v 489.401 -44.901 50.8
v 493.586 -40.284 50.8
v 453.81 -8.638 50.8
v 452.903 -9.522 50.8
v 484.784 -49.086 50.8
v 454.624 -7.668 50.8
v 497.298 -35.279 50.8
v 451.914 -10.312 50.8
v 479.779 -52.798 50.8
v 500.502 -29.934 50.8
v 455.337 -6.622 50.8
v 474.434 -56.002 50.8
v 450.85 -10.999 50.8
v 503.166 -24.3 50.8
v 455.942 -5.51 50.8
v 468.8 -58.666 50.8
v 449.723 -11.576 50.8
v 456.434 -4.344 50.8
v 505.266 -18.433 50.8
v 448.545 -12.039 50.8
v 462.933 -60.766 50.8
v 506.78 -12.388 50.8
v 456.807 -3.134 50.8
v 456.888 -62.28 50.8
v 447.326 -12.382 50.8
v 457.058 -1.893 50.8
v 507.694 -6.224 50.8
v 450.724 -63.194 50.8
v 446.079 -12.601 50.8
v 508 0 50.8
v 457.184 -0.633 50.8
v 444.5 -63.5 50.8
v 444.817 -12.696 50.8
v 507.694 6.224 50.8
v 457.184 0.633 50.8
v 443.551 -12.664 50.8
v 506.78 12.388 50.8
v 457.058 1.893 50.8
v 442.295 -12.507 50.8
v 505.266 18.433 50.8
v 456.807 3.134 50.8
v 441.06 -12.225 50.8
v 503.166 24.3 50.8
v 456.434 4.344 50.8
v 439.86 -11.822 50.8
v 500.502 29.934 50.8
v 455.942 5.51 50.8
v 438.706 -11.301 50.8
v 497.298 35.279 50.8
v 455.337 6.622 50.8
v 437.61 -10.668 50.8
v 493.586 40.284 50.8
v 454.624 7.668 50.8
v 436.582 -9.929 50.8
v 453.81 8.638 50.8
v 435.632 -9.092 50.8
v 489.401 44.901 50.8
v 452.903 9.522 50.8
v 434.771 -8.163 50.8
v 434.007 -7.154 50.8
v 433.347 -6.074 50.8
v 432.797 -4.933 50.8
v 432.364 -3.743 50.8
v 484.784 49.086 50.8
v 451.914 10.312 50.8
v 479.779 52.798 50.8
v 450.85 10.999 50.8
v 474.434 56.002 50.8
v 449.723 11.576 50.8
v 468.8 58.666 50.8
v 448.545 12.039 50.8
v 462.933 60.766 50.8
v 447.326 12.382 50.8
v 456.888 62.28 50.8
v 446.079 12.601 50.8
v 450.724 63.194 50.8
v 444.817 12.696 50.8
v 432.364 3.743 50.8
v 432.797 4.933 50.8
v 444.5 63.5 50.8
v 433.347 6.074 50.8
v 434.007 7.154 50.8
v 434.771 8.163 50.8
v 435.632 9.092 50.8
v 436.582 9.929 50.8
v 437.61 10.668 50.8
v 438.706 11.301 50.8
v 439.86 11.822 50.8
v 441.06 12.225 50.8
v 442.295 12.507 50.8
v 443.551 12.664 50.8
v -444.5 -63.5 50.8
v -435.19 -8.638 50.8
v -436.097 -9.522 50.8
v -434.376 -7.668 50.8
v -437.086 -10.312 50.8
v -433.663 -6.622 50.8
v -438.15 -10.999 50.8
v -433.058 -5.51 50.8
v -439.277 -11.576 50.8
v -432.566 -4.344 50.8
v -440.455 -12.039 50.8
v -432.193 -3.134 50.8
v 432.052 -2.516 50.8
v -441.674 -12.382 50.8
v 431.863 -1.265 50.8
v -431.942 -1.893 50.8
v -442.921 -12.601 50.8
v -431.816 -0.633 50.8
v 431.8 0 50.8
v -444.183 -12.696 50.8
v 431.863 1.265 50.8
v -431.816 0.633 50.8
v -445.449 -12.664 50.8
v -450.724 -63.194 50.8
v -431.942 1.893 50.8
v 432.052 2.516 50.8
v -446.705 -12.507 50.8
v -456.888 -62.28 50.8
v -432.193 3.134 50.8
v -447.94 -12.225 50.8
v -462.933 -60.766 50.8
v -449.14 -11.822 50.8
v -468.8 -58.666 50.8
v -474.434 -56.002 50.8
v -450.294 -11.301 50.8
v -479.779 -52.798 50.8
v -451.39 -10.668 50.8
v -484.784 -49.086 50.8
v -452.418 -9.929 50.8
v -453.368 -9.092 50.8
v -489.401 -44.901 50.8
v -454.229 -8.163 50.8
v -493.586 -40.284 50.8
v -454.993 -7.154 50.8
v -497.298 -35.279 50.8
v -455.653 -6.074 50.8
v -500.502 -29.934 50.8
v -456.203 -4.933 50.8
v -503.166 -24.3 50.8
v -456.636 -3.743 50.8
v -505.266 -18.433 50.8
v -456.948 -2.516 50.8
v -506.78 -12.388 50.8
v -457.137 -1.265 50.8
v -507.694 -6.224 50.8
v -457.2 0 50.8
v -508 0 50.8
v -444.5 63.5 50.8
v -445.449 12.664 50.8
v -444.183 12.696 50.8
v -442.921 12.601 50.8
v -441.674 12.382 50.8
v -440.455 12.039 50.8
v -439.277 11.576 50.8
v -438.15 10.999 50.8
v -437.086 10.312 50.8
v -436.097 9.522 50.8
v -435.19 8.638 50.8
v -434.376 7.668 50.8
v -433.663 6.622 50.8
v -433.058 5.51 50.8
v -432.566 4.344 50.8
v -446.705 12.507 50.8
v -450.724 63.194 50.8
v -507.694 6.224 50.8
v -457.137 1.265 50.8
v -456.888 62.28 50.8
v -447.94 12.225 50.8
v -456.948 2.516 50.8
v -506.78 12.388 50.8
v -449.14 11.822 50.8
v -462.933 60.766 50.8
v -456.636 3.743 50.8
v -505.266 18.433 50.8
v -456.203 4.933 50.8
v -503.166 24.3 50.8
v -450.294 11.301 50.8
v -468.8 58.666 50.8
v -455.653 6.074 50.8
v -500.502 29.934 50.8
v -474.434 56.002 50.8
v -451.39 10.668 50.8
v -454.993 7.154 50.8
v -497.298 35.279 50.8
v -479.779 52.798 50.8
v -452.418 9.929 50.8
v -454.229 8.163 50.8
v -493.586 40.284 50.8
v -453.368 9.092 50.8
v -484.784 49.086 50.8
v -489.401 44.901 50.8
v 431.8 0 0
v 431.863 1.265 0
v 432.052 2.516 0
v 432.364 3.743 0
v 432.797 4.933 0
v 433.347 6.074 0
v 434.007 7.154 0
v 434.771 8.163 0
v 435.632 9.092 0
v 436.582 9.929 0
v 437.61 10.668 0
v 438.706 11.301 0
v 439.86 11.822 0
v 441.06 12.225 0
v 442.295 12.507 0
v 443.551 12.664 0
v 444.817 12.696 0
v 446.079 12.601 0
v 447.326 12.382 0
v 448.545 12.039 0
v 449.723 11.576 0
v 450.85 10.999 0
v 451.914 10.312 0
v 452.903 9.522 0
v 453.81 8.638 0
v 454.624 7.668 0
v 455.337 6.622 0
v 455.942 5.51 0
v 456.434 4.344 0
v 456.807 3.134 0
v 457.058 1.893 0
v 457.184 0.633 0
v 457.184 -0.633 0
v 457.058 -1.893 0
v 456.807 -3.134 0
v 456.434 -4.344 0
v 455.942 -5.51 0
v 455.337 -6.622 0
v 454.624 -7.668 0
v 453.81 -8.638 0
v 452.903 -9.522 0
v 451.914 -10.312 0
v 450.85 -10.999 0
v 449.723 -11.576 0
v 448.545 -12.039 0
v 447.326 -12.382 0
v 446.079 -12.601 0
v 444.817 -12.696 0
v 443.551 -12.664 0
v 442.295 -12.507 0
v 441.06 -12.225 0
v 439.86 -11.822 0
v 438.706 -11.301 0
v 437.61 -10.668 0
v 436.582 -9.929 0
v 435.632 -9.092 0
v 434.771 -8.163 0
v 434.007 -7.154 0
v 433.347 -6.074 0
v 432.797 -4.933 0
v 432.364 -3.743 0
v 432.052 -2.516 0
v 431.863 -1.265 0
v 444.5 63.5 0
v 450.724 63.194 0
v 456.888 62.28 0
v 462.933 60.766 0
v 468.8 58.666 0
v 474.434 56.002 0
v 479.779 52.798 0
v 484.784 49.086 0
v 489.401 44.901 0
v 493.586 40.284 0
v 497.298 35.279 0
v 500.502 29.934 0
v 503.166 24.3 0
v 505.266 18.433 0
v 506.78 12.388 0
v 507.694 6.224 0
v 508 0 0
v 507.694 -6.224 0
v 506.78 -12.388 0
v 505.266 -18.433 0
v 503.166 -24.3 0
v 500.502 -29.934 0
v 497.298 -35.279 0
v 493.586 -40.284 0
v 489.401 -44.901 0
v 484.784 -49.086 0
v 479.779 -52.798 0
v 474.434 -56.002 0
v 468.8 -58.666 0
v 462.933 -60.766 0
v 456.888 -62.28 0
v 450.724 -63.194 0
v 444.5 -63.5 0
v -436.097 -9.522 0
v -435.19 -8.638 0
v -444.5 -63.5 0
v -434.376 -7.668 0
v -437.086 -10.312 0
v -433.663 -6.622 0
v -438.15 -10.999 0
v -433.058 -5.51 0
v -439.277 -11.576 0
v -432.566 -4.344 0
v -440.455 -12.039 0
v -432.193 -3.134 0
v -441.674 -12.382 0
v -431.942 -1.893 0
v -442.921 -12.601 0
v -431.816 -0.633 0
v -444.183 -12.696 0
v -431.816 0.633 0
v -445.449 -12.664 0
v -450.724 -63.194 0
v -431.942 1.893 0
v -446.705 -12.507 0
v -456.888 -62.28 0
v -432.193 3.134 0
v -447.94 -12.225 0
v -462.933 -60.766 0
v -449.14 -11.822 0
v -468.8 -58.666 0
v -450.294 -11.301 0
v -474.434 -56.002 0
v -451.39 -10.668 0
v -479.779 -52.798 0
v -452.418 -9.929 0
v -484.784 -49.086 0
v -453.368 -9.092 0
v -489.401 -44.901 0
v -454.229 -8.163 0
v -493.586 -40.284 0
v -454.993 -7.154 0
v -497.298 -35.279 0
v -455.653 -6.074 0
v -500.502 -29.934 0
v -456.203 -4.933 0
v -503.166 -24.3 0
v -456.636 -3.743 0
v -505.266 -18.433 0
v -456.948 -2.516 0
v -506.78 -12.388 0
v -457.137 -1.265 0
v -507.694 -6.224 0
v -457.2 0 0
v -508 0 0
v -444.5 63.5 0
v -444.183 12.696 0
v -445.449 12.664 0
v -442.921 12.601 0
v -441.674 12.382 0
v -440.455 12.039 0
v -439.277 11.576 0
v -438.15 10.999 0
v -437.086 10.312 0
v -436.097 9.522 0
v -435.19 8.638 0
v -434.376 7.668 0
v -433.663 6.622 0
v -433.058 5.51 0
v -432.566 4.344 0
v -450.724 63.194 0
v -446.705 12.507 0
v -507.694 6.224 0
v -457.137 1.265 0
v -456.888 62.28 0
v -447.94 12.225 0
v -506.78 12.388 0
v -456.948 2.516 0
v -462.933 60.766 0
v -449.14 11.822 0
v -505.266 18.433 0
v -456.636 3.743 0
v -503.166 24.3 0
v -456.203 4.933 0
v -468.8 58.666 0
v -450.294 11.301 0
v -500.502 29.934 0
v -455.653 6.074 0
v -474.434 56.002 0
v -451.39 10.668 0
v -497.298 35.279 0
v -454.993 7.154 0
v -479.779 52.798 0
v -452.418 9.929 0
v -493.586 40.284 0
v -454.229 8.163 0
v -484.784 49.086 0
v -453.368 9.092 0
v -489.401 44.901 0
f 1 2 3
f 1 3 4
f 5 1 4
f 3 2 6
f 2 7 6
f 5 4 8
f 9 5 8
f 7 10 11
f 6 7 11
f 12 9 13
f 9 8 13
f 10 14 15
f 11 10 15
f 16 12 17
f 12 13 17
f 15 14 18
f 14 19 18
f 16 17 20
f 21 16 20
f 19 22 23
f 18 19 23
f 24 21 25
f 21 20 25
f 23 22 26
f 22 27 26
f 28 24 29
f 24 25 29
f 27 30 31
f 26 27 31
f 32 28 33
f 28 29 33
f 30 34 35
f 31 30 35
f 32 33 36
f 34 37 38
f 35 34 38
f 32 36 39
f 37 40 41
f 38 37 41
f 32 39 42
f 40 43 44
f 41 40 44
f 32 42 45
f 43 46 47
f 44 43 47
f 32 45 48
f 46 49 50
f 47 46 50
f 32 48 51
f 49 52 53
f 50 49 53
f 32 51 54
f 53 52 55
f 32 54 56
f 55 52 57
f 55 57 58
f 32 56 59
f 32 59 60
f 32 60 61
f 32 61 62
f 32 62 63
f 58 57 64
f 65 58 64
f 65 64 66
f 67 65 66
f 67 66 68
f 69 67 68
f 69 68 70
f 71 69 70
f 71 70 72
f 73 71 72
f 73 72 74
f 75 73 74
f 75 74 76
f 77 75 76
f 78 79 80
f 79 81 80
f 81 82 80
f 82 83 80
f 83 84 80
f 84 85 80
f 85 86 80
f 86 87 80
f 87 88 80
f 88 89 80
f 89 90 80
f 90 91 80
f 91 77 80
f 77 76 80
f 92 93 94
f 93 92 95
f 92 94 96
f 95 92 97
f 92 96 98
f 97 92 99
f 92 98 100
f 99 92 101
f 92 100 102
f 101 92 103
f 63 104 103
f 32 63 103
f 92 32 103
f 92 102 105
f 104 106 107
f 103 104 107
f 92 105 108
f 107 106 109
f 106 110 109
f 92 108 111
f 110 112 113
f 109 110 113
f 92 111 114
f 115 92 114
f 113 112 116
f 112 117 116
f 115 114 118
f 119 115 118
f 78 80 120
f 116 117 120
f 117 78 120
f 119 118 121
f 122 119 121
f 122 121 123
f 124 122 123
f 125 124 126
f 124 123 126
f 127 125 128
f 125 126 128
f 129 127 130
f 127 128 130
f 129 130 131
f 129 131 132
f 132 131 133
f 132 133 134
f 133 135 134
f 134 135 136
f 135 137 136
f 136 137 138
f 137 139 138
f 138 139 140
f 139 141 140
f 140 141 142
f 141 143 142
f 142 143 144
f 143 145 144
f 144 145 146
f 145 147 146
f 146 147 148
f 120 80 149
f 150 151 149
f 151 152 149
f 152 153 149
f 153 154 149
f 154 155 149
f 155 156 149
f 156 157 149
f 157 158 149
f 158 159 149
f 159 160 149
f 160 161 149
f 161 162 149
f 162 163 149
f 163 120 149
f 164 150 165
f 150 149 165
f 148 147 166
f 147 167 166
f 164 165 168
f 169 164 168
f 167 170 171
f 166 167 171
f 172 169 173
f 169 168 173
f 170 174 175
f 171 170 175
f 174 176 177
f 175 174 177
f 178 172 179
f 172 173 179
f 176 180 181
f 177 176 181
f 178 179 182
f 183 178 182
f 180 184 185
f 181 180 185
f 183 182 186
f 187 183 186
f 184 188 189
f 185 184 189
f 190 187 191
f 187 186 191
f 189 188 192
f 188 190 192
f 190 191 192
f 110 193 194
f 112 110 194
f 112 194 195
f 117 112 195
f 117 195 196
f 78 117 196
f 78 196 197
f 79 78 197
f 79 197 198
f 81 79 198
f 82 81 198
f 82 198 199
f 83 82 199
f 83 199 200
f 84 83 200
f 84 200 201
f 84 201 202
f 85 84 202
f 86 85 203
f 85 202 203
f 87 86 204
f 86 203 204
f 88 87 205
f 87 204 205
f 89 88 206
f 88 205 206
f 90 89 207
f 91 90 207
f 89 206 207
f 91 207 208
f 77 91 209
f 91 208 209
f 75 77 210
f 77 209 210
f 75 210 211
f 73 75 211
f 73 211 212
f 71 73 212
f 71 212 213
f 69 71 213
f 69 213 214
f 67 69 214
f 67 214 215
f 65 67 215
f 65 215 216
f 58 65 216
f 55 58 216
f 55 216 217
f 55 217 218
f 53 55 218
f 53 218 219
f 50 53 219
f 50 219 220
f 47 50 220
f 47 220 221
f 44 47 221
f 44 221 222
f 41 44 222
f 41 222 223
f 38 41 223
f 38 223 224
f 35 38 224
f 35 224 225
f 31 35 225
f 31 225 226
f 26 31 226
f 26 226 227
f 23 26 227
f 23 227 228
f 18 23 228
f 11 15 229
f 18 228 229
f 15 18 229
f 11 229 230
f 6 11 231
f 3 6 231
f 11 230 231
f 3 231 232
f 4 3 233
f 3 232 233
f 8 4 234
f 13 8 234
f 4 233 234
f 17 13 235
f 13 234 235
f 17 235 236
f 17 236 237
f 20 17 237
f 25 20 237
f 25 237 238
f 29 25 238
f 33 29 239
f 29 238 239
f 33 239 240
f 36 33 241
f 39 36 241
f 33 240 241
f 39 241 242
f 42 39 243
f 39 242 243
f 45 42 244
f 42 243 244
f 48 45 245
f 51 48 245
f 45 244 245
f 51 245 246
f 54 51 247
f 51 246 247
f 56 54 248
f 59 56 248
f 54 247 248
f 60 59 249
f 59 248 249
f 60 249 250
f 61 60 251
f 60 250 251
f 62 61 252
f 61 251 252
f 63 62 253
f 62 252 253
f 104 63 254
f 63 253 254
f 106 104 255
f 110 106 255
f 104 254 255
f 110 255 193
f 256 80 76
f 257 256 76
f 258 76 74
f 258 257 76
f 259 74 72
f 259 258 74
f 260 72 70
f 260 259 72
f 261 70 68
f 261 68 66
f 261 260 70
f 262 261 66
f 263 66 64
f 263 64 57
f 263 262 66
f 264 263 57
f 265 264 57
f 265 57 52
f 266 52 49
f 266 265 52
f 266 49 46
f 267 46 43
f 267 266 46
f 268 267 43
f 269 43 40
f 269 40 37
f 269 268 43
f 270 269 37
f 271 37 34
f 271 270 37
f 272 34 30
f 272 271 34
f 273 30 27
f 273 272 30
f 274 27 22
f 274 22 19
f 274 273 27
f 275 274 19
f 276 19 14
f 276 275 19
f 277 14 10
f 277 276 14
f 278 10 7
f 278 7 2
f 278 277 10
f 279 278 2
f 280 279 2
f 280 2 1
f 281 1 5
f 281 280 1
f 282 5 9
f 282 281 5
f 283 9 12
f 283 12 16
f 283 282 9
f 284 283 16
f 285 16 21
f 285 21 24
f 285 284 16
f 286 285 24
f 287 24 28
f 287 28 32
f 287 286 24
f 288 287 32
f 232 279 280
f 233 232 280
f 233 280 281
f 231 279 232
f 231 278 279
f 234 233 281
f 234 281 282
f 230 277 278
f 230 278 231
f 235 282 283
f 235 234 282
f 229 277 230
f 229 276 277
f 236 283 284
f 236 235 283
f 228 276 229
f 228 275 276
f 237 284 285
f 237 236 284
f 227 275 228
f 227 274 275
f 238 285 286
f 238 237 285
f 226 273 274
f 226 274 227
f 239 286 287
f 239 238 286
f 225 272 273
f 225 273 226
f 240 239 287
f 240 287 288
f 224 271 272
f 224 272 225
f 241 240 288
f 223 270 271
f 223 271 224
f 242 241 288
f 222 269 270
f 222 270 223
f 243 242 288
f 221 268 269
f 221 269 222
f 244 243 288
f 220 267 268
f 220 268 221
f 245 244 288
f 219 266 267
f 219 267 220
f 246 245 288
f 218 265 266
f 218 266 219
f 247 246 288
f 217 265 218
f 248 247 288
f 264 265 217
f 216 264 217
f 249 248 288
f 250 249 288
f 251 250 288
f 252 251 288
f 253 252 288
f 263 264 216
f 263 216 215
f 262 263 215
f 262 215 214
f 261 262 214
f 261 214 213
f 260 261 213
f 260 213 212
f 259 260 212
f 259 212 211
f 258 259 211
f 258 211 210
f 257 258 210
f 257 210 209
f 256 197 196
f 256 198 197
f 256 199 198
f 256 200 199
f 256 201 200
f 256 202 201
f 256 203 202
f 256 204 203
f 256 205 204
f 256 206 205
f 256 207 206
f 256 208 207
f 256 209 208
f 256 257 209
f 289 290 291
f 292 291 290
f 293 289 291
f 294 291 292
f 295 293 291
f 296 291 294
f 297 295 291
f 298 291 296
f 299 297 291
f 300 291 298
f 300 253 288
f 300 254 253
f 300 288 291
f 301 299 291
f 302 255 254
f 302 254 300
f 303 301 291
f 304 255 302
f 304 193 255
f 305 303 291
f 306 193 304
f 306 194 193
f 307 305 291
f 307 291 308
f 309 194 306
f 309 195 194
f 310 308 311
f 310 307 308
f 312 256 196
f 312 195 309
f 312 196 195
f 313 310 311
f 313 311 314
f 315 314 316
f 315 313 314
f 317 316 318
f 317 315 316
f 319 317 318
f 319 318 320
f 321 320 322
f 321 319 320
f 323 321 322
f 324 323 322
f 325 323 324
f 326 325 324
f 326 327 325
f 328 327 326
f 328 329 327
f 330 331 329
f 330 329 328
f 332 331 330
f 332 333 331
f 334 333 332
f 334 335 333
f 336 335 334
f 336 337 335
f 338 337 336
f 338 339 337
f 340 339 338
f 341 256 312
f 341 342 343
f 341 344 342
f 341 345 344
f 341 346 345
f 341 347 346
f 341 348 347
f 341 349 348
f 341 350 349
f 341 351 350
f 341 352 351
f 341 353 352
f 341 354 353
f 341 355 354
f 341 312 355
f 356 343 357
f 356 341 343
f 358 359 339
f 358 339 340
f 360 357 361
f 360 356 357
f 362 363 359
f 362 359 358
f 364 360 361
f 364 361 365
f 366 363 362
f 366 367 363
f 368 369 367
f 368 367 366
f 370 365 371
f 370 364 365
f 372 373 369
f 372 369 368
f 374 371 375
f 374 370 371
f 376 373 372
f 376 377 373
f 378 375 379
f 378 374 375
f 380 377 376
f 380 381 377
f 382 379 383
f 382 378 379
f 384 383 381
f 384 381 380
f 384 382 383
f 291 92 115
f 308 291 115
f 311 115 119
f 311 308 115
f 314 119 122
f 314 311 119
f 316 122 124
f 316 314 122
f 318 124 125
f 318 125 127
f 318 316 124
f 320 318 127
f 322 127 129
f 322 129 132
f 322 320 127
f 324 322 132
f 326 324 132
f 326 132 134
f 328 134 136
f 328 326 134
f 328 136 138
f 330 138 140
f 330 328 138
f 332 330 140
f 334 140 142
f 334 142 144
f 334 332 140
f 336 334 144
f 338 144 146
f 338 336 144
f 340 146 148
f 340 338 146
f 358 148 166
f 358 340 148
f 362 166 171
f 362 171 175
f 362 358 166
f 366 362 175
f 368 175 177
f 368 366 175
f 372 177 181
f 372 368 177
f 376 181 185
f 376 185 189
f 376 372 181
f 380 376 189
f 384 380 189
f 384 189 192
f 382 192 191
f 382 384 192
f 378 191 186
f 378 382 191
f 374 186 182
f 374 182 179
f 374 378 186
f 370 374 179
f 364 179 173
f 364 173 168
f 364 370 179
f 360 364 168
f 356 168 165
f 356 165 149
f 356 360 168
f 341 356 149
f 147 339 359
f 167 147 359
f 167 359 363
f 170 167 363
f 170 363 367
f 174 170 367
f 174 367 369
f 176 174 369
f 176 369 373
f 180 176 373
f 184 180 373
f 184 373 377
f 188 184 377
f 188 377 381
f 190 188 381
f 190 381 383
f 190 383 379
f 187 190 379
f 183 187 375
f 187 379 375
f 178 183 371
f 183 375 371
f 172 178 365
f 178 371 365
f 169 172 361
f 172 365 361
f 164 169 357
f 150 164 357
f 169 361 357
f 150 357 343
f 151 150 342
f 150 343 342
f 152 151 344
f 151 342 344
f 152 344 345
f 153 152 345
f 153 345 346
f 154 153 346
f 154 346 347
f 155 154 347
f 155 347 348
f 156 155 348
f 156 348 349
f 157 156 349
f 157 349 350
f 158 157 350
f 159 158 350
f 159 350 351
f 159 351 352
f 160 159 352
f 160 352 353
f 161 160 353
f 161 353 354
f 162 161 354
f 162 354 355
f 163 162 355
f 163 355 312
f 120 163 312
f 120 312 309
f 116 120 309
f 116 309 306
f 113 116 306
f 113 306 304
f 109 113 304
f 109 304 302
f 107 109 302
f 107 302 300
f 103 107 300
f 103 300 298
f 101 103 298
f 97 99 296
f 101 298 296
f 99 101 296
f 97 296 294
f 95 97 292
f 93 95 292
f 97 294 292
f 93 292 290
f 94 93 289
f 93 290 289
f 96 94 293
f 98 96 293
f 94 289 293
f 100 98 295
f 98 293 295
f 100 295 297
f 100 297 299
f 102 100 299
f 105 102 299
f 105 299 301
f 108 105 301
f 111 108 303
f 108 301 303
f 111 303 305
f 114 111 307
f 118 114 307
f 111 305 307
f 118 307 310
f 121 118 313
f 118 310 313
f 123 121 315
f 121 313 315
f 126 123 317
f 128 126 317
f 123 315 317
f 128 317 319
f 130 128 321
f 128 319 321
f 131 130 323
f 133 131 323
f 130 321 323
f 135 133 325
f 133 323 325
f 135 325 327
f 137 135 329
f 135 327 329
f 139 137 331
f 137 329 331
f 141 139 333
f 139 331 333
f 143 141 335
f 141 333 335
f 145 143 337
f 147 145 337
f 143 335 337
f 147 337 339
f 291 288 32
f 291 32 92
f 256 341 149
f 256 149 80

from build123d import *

# Parameters (mm, degrees)
BOSS_EXTRUDE1_DEPTH = 50.8
SKETCH2_R           = 12.7
CUT_EXTRUDE1_DEPTH  = 515.467579153


with BuildPart() as part:
    # Sketch1 → Boss-Extrude1 (new body)
    with BuildSketch(Plane.XY):
        with BuildLine():
            Line((-444.5, 63.5), (444.5, 63.5))
            ThreePointArc((444.5, 63.5), (508, 0), (444.5, -63.5))
            Line((444.5, -63.5), (-444.5, -63.5))
            ThreePointArc((-444.5, -63.5), (-508, 0), (-444.5, 63.5))
        make_face()
    extrude(amount=BOSS_EXTRUDE1_DEPTH)

    # Sketch2 → Cut-Extrude1 (cut, through all)
    with BuildSketch(Plane(origin=(0, 0, 0), x_dir=(-1, 0, 0), z_dir=(0, 0, -1))):
        with Locations((444.5, 0)):
            Circle(SKETCH2_R)
        with Locations((-444.5, 0)):
            Circle(SKETCH2_R)
    extrude(amount=-CUT_EXTRUDE1_DEPTH, mode=Mode.SUBTRACT)


solid = part.part
